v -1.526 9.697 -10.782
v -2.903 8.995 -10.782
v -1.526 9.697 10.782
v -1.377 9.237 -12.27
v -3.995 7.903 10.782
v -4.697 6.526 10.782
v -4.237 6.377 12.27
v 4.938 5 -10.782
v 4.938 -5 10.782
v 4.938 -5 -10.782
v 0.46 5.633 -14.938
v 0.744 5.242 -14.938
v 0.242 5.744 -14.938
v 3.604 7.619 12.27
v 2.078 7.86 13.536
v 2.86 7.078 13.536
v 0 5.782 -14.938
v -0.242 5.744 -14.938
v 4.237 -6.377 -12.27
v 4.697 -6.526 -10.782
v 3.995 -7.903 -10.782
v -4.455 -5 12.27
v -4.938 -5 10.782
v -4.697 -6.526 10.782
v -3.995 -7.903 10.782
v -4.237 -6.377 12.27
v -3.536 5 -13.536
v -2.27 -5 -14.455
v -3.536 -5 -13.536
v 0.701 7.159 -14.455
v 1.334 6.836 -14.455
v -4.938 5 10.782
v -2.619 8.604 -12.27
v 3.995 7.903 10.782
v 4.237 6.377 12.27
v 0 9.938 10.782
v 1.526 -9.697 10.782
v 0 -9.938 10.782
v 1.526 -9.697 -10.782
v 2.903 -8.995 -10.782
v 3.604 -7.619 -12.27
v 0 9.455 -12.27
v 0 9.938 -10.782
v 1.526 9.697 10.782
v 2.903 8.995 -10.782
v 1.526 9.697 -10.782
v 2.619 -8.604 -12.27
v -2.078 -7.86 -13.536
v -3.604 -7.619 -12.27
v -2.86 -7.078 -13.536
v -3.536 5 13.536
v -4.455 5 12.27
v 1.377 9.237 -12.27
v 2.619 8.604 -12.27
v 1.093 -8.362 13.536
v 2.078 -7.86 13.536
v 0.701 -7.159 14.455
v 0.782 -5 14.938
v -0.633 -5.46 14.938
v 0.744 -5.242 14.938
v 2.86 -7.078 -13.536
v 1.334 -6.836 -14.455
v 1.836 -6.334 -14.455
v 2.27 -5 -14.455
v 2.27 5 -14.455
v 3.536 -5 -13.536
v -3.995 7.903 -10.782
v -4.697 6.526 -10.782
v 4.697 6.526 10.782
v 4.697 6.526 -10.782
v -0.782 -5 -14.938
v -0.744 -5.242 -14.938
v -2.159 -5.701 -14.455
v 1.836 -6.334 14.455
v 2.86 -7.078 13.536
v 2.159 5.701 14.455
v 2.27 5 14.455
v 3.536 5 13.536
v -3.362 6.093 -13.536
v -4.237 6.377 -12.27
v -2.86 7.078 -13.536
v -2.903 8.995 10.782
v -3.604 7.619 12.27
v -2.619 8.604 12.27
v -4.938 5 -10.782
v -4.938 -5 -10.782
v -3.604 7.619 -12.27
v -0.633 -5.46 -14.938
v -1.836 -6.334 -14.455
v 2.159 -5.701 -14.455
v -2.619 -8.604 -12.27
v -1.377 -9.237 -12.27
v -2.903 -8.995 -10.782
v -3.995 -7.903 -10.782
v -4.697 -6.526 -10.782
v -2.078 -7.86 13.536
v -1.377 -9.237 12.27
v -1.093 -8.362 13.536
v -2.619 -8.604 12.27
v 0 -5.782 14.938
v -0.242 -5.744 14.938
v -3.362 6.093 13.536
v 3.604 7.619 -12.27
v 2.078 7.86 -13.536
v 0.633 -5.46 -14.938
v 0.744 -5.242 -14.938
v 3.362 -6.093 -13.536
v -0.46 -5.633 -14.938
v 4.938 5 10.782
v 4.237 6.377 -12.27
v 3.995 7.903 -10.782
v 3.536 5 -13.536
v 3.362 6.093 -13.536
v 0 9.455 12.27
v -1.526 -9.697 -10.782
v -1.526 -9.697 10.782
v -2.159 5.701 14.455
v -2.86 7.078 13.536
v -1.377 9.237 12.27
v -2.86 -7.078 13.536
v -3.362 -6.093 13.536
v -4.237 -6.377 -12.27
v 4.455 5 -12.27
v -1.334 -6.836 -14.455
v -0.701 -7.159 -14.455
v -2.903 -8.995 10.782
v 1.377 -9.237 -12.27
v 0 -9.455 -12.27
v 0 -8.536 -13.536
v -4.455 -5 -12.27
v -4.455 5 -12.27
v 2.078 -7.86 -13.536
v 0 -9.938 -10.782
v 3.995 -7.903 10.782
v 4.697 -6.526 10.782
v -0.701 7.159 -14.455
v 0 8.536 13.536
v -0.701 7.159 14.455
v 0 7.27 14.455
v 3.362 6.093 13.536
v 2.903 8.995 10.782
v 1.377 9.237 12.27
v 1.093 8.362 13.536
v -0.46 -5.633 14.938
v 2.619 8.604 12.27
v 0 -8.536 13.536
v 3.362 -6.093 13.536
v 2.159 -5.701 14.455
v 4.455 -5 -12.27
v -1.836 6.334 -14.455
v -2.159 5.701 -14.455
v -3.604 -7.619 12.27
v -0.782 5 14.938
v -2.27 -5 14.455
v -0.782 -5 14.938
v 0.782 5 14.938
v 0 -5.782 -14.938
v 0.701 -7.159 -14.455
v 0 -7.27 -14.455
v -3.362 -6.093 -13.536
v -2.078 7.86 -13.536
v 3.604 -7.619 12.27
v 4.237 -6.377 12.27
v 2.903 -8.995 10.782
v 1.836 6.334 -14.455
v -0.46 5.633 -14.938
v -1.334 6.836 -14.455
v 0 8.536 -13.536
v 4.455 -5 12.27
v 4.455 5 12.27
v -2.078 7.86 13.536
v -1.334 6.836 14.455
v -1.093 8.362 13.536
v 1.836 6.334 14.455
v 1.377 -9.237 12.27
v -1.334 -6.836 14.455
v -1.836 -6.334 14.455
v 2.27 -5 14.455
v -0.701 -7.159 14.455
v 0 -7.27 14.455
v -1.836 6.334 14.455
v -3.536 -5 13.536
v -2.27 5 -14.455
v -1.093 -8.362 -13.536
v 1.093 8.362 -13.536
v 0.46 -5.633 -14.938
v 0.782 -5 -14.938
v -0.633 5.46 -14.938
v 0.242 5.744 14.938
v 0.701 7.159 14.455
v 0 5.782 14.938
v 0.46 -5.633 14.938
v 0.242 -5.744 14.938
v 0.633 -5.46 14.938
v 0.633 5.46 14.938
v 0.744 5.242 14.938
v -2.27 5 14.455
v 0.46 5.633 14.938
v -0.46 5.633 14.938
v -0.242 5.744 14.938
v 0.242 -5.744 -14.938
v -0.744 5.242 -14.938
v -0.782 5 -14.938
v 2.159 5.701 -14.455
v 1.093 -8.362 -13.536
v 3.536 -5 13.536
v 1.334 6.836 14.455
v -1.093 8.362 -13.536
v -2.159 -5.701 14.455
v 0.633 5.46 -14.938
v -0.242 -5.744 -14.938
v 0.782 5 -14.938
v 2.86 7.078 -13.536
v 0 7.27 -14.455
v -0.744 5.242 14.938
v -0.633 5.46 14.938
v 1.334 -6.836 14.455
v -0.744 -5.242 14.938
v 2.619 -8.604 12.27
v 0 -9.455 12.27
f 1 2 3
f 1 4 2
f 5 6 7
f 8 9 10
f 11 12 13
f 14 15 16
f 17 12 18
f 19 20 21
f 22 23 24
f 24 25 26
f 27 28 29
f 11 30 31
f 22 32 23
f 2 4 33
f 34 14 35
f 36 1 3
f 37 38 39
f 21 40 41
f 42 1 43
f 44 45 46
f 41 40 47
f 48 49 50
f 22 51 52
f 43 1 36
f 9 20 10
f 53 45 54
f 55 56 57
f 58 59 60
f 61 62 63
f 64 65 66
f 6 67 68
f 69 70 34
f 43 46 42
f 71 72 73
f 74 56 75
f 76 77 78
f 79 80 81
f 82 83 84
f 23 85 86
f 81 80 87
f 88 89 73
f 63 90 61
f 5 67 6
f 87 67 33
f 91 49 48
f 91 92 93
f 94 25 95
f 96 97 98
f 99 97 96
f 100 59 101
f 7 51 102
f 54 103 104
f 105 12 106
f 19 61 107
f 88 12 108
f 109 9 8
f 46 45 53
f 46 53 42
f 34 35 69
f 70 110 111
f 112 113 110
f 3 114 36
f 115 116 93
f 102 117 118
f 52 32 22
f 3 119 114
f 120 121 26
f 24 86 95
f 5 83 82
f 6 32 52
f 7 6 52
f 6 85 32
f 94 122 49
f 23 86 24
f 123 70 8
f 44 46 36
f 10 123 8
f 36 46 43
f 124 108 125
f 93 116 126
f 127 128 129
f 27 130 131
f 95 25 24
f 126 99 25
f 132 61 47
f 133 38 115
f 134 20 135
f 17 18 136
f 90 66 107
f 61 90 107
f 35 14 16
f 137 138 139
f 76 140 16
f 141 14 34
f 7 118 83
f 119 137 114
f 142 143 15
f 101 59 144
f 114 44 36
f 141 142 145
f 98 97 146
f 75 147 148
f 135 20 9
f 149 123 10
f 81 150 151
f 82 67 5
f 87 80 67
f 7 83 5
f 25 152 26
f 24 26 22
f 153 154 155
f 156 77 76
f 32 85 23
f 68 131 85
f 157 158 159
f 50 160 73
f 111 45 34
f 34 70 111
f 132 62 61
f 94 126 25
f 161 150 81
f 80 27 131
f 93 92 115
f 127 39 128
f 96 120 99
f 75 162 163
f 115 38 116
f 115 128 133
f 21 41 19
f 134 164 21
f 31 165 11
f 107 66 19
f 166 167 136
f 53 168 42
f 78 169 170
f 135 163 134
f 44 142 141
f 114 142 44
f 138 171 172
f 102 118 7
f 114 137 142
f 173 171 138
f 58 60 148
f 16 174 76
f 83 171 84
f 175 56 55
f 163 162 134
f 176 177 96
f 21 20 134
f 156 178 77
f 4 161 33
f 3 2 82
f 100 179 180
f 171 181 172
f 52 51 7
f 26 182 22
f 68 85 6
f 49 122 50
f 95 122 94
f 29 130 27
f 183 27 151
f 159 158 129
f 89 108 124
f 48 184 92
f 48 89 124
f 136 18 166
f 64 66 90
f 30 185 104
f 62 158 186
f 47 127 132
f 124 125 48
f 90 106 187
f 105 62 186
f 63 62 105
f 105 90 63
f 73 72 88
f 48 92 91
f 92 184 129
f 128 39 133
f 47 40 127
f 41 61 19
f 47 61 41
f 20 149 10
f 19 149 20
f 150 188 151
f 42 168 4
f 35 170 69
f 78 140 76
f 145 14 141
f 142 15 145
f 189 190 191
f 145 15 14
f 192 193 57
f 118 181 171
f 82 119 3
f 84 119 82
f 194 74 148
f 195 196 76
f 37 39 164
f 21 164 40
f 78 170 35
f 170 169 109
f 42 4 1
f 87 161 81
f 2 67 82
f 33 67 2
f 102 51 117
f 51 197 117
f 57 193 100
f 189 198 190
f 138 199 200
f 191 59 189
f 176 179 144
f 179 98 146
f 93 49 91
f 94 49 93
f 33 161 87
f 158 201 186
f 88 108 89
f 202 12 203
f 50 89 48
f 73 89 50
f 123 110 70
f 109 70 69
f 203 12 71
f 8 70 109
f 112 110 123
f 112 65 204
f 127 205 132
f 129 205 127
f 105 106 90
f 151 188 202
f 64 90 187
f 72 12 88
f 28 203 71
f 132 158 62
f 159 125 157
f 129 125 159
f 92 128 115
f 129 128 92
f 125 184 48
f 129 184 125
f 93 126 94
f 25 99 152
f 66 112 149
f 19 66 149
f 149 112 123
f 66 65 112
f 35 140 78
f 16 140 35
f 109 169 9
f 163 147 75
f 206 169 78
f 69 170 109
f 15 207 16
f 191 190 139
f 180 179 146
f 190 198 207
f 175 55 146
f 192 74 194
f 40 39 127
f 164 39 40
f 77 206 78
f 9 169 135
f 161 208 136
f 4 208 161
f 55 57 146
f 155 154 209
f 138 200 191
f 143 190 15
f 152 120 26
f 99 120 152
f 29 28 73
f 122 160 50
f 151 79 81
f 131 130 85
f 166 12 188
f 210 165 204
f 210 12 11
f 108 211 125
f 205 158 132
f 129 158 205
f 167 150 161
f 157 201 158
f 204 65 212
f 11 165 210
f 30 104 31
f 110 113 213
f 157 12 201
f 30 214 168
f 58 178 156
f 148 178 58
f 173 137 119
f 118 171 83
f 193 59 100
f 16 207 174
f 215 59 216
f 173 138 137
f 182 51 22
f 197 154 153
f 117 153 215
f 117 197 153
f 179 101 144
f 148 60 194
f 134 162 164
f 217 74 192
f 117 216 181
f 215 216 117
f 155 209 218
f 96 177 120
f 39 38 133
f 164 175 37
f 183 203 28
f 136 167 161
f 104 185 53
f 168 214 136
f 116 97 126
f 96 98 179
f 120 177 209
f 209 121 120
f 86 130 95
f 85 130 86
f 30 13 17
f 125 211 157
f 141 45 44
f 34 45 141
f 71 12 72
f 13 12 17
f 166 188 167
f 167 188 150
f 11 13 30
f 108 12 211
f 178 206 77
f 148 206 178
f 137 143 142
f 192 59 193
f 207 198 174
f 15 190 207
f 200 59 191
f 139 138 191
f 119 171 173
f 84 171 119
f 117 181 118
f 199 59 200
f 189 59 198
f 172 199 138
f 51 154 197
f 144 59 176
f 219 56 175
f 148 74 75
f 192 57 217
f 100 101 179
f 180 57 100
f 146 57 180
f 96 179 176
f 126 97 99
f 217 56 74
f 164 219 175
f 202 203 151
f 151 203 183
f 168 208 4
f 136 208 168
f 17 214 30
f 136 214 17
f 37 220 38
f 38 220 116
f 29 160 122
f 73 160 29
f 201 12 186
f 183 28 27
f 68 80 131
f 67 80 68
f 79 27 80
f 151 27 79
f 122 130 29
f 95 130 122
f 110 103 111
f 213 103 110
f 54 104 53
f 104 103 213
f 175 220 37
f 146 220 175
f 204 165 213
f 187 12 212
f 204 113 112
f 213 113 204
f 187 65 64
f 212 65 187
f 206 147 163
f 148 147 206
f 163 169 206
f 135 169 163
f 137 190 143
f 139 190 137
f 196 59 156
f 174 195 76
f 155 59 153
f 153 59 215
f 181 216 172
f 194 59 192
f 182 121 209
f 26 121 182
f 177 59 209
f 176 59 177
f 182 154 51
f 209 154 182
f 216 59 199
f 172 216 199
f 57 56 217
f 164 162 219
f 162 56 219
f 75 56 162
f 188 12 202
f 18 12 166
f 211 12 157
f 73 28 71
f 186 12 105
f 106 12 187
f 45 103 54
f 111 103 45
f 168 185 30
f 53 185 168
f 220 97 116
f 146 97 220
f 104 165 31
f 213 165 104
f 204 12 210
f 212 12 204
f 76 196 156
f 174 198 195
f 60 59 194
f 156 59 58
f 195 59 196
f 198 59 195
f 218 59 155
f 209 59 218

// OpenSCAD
// Make a cube out of the convex hull of 8 points. The points are moved toward
// the center so that the sides of the cube agree with the dimensions given
// w - width
// l - length
// h - height
// r - corner radius
module rounded_cube(w,l,h,r,center=false) {
    hull () {
        for (p=[
                [r,r,r],
                [r,r,h-r],
                [r,l-r,r],
                [r,l-r,h-r],
                [w-r,r,r],
                [w-r,r,h-r],
                [w-r,l-r,r],
                [w-r,l-r,h-r]
                ]) {
            if (center) {
                translate(p-[w*0.5,l*0.5,h*0.5])
                    sphere(r);
            } else {
                translate(p)
                    sphere(r);
            }
        }
    }
}

$fn=20;

rounded_cube(10,20,30,5,center=true);
